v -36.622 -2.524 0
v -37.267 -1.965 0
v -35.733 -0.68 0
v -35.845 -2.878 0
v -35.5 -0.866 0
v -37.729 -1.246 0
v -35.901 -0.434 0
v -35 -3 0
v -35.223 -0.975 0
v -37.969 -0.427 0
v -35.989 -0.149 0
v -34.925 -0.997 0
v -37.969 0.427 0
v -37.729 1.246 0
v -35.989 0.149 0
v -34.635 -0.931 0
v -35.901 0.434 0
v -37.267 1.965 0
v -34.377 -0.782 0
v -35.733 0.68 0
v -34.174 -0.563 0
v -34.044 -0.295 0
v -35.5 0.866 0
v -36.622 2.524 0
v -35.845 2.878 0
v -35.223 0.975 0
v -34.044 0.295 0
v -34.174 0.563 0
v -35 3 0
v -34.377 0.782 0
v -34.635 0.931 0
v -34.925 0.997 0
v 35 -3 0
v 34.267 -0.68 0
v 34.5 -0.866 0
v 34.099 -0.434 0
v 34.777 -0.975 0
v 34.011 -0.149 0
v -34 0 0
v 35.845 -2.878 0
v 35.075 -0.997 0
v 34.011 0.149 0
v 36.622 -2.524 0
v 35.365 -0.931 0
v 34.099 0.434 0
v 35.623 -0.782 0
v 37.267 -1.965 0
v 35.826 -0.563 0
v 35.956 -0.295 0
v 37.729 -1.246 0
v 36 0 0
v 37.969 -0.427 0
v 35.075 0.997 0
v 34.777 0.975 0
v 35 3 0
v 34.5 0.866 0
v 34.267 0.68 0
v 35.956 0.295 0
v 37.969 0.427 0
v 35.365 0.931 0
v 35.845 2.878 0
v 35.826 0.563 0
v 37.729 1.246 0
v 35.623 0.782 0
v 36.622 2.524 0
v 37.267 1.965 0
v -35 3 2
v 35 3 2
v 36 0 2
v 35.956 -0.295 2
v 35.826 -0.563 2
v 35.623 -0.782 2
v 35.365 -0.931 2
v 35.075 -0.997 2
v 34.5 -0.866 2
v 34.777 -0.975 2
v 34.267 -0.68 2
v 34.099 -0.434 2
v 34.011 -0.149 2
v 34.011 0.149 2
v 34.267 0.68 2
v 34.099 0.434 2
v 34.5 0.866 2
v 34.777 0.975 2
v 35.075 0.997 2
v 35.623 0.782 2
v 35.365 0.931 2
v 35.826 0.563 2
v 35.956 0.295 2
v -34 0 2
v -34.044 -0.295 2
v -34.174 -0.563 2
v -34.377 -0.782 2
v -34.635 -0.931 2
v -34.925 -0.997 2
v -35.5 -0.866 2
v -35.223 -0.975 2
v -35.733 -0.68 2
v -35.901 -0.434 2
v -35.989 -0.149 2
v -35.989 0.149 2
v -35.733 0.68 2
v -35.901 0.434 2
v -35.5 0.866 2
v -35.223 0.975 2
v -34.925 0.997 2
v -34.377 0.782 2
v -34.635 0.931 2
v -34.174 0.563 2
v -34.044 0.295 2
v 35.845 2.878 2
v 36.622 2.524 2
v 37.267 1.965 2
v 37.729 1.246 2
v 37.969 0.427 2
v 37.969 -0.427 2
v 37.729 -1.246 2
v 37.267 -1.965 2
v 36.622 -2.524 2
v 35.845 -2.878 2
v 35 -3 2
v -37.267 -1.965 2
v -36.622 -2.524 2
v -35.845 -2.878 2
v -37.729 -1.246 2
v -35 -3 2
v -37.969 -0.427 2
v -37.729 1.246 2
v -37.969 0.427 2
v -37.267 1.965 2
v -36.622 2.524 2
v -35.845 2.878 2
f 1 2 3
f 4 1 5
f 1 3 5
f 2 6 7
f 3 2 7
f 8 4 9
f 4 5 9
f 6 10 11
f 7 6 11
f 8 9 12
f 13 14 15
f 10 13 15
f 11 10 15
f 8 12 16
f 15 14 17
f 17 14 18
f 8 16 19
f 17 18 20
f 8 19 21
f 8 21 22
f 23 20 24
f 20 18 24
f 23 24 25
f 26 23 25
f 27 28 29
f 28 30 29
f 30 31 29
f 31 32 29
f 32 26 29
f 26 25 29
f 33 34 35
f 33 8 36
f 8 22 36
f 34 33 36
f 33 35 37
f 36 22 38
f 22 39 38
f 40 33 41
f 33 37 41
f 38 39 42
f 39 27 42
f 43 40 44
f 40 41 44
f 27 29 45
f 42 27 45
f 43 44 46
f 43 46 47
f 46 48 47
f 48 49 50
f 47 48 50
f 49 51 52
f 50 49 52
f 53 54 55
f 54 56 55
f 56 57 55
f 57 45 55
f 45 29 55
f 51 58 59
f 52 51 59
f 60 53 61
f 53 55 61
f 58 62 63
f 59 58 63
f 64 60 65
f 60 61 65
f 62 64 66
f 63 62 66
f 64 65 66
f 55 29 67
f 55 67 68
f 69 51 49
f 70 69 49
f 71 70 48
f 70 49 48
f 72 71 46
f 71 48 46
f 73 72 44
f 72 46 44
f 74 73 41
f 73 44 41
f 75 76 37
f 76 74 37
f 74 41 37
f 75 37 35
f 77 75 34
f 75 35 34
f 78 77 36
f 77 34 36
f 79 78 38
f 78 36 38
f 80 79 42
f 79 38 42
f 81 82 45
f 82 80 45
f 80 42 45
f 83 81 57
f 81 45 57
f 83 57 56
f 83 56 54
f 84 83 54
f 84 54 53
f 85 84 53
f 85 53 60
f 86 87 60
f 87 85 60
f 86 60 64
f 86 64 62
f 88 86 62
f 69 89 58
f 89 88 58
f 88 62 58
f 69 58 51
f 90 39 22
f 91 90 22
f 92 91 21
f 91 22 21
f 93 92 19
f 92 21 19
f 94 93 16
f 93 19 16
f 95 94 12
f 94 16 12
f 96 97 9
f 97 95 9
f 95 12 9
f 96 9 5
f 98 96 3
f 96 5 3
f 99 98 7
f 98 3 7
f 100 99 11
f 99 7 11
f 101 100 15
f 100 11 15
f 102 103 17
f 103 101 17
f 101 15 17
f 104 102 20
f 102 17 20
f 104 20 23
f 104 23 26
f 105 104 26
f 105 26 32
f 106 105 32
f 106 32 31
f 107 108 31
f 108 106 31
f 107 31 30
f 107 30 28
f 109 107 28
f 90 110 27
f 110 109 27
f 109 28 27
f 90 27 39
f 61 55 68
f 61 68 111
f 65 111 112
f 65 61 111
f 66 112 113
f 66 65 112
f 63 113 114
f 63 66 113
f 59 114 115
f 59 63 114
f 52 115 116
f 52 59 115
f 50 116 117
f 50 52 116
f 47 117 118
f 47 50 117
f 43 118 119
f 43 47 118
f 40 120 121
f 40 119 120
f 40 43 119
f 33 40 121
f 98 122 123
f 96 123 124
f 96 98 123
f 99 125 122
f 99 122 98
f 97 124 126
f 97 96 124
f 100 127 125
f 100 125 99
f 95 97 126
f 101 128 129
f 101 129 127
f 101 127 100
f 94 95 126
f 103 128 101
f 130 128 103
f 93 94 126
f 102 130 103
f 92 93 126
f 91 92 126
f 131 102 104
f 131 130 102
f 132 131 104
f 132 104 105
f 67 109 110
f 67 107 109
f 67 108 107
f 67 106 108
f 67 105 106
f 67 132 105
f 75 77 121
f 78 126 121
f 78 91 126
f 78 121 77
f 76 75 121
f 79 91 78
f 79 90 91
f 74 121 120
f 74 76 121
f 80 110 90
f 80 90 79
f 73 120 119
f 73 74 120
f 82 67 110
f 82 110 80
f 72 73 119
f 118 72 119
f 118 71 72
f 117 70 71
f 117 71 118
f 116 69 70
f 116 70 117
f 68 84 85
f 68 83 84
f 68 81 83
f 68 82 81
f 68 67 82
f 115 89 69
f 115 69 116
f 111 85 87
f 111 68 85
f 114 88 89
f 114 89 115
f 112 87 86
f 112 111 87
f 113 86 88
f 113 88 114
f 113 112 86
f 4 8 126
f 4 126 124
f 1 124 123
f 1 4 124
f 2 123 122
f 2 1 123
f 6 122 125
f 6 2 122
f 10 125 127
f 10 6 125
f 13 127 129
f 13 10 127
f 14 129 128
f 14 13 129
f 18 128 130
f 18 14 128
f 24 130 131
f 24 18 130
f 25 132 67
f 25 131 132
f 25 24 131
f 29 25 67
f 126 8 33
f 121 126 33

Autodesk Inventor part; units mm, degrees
ref_plane "YZ Plane" through (0, 0, 0) normal (1, 0, 0) x (0, 1, 0)
ref_plane "XZ Plane" through (0, 0, 0) normal (0, 1, 0) x (-1, 0, 0)
ref_plane "XY Plane" through (0, 0, 0) normal (0, 0, 1) x (1, 0, 0)
sketch "Sketch1" plane through (0, 0, 0) normal (0, 0, 1) x (1, 0, 0)
  circle A0 centre (-35, 0) radius 1
  circle A1 centre (35, 0) radius 1
  line L0 (-35, 0) -> (0, 0) construction
  line L1 (0, 0) -> (35, 0) construction
  line L2 (-35, 3) -> (35, 3)
  line L3 (-35, -3) -> (35, -3)
  line L4 (0, 3) -> (0, -3) construction
  arc A2 (-35, 3) -> (-35, -3) centre (-35, 0) ccw
  arc A3 (35, -3) -> (35, 3) centre (35, 0) ccw
  point P0 (-35, -1)
  dimension "d0" = 2
  dimension "d1" = 2
  dimension "d2" = 35
extrude "Extrusion1" add sketch "Sketch1" along normal blind 2
properties part number "LongLink"
